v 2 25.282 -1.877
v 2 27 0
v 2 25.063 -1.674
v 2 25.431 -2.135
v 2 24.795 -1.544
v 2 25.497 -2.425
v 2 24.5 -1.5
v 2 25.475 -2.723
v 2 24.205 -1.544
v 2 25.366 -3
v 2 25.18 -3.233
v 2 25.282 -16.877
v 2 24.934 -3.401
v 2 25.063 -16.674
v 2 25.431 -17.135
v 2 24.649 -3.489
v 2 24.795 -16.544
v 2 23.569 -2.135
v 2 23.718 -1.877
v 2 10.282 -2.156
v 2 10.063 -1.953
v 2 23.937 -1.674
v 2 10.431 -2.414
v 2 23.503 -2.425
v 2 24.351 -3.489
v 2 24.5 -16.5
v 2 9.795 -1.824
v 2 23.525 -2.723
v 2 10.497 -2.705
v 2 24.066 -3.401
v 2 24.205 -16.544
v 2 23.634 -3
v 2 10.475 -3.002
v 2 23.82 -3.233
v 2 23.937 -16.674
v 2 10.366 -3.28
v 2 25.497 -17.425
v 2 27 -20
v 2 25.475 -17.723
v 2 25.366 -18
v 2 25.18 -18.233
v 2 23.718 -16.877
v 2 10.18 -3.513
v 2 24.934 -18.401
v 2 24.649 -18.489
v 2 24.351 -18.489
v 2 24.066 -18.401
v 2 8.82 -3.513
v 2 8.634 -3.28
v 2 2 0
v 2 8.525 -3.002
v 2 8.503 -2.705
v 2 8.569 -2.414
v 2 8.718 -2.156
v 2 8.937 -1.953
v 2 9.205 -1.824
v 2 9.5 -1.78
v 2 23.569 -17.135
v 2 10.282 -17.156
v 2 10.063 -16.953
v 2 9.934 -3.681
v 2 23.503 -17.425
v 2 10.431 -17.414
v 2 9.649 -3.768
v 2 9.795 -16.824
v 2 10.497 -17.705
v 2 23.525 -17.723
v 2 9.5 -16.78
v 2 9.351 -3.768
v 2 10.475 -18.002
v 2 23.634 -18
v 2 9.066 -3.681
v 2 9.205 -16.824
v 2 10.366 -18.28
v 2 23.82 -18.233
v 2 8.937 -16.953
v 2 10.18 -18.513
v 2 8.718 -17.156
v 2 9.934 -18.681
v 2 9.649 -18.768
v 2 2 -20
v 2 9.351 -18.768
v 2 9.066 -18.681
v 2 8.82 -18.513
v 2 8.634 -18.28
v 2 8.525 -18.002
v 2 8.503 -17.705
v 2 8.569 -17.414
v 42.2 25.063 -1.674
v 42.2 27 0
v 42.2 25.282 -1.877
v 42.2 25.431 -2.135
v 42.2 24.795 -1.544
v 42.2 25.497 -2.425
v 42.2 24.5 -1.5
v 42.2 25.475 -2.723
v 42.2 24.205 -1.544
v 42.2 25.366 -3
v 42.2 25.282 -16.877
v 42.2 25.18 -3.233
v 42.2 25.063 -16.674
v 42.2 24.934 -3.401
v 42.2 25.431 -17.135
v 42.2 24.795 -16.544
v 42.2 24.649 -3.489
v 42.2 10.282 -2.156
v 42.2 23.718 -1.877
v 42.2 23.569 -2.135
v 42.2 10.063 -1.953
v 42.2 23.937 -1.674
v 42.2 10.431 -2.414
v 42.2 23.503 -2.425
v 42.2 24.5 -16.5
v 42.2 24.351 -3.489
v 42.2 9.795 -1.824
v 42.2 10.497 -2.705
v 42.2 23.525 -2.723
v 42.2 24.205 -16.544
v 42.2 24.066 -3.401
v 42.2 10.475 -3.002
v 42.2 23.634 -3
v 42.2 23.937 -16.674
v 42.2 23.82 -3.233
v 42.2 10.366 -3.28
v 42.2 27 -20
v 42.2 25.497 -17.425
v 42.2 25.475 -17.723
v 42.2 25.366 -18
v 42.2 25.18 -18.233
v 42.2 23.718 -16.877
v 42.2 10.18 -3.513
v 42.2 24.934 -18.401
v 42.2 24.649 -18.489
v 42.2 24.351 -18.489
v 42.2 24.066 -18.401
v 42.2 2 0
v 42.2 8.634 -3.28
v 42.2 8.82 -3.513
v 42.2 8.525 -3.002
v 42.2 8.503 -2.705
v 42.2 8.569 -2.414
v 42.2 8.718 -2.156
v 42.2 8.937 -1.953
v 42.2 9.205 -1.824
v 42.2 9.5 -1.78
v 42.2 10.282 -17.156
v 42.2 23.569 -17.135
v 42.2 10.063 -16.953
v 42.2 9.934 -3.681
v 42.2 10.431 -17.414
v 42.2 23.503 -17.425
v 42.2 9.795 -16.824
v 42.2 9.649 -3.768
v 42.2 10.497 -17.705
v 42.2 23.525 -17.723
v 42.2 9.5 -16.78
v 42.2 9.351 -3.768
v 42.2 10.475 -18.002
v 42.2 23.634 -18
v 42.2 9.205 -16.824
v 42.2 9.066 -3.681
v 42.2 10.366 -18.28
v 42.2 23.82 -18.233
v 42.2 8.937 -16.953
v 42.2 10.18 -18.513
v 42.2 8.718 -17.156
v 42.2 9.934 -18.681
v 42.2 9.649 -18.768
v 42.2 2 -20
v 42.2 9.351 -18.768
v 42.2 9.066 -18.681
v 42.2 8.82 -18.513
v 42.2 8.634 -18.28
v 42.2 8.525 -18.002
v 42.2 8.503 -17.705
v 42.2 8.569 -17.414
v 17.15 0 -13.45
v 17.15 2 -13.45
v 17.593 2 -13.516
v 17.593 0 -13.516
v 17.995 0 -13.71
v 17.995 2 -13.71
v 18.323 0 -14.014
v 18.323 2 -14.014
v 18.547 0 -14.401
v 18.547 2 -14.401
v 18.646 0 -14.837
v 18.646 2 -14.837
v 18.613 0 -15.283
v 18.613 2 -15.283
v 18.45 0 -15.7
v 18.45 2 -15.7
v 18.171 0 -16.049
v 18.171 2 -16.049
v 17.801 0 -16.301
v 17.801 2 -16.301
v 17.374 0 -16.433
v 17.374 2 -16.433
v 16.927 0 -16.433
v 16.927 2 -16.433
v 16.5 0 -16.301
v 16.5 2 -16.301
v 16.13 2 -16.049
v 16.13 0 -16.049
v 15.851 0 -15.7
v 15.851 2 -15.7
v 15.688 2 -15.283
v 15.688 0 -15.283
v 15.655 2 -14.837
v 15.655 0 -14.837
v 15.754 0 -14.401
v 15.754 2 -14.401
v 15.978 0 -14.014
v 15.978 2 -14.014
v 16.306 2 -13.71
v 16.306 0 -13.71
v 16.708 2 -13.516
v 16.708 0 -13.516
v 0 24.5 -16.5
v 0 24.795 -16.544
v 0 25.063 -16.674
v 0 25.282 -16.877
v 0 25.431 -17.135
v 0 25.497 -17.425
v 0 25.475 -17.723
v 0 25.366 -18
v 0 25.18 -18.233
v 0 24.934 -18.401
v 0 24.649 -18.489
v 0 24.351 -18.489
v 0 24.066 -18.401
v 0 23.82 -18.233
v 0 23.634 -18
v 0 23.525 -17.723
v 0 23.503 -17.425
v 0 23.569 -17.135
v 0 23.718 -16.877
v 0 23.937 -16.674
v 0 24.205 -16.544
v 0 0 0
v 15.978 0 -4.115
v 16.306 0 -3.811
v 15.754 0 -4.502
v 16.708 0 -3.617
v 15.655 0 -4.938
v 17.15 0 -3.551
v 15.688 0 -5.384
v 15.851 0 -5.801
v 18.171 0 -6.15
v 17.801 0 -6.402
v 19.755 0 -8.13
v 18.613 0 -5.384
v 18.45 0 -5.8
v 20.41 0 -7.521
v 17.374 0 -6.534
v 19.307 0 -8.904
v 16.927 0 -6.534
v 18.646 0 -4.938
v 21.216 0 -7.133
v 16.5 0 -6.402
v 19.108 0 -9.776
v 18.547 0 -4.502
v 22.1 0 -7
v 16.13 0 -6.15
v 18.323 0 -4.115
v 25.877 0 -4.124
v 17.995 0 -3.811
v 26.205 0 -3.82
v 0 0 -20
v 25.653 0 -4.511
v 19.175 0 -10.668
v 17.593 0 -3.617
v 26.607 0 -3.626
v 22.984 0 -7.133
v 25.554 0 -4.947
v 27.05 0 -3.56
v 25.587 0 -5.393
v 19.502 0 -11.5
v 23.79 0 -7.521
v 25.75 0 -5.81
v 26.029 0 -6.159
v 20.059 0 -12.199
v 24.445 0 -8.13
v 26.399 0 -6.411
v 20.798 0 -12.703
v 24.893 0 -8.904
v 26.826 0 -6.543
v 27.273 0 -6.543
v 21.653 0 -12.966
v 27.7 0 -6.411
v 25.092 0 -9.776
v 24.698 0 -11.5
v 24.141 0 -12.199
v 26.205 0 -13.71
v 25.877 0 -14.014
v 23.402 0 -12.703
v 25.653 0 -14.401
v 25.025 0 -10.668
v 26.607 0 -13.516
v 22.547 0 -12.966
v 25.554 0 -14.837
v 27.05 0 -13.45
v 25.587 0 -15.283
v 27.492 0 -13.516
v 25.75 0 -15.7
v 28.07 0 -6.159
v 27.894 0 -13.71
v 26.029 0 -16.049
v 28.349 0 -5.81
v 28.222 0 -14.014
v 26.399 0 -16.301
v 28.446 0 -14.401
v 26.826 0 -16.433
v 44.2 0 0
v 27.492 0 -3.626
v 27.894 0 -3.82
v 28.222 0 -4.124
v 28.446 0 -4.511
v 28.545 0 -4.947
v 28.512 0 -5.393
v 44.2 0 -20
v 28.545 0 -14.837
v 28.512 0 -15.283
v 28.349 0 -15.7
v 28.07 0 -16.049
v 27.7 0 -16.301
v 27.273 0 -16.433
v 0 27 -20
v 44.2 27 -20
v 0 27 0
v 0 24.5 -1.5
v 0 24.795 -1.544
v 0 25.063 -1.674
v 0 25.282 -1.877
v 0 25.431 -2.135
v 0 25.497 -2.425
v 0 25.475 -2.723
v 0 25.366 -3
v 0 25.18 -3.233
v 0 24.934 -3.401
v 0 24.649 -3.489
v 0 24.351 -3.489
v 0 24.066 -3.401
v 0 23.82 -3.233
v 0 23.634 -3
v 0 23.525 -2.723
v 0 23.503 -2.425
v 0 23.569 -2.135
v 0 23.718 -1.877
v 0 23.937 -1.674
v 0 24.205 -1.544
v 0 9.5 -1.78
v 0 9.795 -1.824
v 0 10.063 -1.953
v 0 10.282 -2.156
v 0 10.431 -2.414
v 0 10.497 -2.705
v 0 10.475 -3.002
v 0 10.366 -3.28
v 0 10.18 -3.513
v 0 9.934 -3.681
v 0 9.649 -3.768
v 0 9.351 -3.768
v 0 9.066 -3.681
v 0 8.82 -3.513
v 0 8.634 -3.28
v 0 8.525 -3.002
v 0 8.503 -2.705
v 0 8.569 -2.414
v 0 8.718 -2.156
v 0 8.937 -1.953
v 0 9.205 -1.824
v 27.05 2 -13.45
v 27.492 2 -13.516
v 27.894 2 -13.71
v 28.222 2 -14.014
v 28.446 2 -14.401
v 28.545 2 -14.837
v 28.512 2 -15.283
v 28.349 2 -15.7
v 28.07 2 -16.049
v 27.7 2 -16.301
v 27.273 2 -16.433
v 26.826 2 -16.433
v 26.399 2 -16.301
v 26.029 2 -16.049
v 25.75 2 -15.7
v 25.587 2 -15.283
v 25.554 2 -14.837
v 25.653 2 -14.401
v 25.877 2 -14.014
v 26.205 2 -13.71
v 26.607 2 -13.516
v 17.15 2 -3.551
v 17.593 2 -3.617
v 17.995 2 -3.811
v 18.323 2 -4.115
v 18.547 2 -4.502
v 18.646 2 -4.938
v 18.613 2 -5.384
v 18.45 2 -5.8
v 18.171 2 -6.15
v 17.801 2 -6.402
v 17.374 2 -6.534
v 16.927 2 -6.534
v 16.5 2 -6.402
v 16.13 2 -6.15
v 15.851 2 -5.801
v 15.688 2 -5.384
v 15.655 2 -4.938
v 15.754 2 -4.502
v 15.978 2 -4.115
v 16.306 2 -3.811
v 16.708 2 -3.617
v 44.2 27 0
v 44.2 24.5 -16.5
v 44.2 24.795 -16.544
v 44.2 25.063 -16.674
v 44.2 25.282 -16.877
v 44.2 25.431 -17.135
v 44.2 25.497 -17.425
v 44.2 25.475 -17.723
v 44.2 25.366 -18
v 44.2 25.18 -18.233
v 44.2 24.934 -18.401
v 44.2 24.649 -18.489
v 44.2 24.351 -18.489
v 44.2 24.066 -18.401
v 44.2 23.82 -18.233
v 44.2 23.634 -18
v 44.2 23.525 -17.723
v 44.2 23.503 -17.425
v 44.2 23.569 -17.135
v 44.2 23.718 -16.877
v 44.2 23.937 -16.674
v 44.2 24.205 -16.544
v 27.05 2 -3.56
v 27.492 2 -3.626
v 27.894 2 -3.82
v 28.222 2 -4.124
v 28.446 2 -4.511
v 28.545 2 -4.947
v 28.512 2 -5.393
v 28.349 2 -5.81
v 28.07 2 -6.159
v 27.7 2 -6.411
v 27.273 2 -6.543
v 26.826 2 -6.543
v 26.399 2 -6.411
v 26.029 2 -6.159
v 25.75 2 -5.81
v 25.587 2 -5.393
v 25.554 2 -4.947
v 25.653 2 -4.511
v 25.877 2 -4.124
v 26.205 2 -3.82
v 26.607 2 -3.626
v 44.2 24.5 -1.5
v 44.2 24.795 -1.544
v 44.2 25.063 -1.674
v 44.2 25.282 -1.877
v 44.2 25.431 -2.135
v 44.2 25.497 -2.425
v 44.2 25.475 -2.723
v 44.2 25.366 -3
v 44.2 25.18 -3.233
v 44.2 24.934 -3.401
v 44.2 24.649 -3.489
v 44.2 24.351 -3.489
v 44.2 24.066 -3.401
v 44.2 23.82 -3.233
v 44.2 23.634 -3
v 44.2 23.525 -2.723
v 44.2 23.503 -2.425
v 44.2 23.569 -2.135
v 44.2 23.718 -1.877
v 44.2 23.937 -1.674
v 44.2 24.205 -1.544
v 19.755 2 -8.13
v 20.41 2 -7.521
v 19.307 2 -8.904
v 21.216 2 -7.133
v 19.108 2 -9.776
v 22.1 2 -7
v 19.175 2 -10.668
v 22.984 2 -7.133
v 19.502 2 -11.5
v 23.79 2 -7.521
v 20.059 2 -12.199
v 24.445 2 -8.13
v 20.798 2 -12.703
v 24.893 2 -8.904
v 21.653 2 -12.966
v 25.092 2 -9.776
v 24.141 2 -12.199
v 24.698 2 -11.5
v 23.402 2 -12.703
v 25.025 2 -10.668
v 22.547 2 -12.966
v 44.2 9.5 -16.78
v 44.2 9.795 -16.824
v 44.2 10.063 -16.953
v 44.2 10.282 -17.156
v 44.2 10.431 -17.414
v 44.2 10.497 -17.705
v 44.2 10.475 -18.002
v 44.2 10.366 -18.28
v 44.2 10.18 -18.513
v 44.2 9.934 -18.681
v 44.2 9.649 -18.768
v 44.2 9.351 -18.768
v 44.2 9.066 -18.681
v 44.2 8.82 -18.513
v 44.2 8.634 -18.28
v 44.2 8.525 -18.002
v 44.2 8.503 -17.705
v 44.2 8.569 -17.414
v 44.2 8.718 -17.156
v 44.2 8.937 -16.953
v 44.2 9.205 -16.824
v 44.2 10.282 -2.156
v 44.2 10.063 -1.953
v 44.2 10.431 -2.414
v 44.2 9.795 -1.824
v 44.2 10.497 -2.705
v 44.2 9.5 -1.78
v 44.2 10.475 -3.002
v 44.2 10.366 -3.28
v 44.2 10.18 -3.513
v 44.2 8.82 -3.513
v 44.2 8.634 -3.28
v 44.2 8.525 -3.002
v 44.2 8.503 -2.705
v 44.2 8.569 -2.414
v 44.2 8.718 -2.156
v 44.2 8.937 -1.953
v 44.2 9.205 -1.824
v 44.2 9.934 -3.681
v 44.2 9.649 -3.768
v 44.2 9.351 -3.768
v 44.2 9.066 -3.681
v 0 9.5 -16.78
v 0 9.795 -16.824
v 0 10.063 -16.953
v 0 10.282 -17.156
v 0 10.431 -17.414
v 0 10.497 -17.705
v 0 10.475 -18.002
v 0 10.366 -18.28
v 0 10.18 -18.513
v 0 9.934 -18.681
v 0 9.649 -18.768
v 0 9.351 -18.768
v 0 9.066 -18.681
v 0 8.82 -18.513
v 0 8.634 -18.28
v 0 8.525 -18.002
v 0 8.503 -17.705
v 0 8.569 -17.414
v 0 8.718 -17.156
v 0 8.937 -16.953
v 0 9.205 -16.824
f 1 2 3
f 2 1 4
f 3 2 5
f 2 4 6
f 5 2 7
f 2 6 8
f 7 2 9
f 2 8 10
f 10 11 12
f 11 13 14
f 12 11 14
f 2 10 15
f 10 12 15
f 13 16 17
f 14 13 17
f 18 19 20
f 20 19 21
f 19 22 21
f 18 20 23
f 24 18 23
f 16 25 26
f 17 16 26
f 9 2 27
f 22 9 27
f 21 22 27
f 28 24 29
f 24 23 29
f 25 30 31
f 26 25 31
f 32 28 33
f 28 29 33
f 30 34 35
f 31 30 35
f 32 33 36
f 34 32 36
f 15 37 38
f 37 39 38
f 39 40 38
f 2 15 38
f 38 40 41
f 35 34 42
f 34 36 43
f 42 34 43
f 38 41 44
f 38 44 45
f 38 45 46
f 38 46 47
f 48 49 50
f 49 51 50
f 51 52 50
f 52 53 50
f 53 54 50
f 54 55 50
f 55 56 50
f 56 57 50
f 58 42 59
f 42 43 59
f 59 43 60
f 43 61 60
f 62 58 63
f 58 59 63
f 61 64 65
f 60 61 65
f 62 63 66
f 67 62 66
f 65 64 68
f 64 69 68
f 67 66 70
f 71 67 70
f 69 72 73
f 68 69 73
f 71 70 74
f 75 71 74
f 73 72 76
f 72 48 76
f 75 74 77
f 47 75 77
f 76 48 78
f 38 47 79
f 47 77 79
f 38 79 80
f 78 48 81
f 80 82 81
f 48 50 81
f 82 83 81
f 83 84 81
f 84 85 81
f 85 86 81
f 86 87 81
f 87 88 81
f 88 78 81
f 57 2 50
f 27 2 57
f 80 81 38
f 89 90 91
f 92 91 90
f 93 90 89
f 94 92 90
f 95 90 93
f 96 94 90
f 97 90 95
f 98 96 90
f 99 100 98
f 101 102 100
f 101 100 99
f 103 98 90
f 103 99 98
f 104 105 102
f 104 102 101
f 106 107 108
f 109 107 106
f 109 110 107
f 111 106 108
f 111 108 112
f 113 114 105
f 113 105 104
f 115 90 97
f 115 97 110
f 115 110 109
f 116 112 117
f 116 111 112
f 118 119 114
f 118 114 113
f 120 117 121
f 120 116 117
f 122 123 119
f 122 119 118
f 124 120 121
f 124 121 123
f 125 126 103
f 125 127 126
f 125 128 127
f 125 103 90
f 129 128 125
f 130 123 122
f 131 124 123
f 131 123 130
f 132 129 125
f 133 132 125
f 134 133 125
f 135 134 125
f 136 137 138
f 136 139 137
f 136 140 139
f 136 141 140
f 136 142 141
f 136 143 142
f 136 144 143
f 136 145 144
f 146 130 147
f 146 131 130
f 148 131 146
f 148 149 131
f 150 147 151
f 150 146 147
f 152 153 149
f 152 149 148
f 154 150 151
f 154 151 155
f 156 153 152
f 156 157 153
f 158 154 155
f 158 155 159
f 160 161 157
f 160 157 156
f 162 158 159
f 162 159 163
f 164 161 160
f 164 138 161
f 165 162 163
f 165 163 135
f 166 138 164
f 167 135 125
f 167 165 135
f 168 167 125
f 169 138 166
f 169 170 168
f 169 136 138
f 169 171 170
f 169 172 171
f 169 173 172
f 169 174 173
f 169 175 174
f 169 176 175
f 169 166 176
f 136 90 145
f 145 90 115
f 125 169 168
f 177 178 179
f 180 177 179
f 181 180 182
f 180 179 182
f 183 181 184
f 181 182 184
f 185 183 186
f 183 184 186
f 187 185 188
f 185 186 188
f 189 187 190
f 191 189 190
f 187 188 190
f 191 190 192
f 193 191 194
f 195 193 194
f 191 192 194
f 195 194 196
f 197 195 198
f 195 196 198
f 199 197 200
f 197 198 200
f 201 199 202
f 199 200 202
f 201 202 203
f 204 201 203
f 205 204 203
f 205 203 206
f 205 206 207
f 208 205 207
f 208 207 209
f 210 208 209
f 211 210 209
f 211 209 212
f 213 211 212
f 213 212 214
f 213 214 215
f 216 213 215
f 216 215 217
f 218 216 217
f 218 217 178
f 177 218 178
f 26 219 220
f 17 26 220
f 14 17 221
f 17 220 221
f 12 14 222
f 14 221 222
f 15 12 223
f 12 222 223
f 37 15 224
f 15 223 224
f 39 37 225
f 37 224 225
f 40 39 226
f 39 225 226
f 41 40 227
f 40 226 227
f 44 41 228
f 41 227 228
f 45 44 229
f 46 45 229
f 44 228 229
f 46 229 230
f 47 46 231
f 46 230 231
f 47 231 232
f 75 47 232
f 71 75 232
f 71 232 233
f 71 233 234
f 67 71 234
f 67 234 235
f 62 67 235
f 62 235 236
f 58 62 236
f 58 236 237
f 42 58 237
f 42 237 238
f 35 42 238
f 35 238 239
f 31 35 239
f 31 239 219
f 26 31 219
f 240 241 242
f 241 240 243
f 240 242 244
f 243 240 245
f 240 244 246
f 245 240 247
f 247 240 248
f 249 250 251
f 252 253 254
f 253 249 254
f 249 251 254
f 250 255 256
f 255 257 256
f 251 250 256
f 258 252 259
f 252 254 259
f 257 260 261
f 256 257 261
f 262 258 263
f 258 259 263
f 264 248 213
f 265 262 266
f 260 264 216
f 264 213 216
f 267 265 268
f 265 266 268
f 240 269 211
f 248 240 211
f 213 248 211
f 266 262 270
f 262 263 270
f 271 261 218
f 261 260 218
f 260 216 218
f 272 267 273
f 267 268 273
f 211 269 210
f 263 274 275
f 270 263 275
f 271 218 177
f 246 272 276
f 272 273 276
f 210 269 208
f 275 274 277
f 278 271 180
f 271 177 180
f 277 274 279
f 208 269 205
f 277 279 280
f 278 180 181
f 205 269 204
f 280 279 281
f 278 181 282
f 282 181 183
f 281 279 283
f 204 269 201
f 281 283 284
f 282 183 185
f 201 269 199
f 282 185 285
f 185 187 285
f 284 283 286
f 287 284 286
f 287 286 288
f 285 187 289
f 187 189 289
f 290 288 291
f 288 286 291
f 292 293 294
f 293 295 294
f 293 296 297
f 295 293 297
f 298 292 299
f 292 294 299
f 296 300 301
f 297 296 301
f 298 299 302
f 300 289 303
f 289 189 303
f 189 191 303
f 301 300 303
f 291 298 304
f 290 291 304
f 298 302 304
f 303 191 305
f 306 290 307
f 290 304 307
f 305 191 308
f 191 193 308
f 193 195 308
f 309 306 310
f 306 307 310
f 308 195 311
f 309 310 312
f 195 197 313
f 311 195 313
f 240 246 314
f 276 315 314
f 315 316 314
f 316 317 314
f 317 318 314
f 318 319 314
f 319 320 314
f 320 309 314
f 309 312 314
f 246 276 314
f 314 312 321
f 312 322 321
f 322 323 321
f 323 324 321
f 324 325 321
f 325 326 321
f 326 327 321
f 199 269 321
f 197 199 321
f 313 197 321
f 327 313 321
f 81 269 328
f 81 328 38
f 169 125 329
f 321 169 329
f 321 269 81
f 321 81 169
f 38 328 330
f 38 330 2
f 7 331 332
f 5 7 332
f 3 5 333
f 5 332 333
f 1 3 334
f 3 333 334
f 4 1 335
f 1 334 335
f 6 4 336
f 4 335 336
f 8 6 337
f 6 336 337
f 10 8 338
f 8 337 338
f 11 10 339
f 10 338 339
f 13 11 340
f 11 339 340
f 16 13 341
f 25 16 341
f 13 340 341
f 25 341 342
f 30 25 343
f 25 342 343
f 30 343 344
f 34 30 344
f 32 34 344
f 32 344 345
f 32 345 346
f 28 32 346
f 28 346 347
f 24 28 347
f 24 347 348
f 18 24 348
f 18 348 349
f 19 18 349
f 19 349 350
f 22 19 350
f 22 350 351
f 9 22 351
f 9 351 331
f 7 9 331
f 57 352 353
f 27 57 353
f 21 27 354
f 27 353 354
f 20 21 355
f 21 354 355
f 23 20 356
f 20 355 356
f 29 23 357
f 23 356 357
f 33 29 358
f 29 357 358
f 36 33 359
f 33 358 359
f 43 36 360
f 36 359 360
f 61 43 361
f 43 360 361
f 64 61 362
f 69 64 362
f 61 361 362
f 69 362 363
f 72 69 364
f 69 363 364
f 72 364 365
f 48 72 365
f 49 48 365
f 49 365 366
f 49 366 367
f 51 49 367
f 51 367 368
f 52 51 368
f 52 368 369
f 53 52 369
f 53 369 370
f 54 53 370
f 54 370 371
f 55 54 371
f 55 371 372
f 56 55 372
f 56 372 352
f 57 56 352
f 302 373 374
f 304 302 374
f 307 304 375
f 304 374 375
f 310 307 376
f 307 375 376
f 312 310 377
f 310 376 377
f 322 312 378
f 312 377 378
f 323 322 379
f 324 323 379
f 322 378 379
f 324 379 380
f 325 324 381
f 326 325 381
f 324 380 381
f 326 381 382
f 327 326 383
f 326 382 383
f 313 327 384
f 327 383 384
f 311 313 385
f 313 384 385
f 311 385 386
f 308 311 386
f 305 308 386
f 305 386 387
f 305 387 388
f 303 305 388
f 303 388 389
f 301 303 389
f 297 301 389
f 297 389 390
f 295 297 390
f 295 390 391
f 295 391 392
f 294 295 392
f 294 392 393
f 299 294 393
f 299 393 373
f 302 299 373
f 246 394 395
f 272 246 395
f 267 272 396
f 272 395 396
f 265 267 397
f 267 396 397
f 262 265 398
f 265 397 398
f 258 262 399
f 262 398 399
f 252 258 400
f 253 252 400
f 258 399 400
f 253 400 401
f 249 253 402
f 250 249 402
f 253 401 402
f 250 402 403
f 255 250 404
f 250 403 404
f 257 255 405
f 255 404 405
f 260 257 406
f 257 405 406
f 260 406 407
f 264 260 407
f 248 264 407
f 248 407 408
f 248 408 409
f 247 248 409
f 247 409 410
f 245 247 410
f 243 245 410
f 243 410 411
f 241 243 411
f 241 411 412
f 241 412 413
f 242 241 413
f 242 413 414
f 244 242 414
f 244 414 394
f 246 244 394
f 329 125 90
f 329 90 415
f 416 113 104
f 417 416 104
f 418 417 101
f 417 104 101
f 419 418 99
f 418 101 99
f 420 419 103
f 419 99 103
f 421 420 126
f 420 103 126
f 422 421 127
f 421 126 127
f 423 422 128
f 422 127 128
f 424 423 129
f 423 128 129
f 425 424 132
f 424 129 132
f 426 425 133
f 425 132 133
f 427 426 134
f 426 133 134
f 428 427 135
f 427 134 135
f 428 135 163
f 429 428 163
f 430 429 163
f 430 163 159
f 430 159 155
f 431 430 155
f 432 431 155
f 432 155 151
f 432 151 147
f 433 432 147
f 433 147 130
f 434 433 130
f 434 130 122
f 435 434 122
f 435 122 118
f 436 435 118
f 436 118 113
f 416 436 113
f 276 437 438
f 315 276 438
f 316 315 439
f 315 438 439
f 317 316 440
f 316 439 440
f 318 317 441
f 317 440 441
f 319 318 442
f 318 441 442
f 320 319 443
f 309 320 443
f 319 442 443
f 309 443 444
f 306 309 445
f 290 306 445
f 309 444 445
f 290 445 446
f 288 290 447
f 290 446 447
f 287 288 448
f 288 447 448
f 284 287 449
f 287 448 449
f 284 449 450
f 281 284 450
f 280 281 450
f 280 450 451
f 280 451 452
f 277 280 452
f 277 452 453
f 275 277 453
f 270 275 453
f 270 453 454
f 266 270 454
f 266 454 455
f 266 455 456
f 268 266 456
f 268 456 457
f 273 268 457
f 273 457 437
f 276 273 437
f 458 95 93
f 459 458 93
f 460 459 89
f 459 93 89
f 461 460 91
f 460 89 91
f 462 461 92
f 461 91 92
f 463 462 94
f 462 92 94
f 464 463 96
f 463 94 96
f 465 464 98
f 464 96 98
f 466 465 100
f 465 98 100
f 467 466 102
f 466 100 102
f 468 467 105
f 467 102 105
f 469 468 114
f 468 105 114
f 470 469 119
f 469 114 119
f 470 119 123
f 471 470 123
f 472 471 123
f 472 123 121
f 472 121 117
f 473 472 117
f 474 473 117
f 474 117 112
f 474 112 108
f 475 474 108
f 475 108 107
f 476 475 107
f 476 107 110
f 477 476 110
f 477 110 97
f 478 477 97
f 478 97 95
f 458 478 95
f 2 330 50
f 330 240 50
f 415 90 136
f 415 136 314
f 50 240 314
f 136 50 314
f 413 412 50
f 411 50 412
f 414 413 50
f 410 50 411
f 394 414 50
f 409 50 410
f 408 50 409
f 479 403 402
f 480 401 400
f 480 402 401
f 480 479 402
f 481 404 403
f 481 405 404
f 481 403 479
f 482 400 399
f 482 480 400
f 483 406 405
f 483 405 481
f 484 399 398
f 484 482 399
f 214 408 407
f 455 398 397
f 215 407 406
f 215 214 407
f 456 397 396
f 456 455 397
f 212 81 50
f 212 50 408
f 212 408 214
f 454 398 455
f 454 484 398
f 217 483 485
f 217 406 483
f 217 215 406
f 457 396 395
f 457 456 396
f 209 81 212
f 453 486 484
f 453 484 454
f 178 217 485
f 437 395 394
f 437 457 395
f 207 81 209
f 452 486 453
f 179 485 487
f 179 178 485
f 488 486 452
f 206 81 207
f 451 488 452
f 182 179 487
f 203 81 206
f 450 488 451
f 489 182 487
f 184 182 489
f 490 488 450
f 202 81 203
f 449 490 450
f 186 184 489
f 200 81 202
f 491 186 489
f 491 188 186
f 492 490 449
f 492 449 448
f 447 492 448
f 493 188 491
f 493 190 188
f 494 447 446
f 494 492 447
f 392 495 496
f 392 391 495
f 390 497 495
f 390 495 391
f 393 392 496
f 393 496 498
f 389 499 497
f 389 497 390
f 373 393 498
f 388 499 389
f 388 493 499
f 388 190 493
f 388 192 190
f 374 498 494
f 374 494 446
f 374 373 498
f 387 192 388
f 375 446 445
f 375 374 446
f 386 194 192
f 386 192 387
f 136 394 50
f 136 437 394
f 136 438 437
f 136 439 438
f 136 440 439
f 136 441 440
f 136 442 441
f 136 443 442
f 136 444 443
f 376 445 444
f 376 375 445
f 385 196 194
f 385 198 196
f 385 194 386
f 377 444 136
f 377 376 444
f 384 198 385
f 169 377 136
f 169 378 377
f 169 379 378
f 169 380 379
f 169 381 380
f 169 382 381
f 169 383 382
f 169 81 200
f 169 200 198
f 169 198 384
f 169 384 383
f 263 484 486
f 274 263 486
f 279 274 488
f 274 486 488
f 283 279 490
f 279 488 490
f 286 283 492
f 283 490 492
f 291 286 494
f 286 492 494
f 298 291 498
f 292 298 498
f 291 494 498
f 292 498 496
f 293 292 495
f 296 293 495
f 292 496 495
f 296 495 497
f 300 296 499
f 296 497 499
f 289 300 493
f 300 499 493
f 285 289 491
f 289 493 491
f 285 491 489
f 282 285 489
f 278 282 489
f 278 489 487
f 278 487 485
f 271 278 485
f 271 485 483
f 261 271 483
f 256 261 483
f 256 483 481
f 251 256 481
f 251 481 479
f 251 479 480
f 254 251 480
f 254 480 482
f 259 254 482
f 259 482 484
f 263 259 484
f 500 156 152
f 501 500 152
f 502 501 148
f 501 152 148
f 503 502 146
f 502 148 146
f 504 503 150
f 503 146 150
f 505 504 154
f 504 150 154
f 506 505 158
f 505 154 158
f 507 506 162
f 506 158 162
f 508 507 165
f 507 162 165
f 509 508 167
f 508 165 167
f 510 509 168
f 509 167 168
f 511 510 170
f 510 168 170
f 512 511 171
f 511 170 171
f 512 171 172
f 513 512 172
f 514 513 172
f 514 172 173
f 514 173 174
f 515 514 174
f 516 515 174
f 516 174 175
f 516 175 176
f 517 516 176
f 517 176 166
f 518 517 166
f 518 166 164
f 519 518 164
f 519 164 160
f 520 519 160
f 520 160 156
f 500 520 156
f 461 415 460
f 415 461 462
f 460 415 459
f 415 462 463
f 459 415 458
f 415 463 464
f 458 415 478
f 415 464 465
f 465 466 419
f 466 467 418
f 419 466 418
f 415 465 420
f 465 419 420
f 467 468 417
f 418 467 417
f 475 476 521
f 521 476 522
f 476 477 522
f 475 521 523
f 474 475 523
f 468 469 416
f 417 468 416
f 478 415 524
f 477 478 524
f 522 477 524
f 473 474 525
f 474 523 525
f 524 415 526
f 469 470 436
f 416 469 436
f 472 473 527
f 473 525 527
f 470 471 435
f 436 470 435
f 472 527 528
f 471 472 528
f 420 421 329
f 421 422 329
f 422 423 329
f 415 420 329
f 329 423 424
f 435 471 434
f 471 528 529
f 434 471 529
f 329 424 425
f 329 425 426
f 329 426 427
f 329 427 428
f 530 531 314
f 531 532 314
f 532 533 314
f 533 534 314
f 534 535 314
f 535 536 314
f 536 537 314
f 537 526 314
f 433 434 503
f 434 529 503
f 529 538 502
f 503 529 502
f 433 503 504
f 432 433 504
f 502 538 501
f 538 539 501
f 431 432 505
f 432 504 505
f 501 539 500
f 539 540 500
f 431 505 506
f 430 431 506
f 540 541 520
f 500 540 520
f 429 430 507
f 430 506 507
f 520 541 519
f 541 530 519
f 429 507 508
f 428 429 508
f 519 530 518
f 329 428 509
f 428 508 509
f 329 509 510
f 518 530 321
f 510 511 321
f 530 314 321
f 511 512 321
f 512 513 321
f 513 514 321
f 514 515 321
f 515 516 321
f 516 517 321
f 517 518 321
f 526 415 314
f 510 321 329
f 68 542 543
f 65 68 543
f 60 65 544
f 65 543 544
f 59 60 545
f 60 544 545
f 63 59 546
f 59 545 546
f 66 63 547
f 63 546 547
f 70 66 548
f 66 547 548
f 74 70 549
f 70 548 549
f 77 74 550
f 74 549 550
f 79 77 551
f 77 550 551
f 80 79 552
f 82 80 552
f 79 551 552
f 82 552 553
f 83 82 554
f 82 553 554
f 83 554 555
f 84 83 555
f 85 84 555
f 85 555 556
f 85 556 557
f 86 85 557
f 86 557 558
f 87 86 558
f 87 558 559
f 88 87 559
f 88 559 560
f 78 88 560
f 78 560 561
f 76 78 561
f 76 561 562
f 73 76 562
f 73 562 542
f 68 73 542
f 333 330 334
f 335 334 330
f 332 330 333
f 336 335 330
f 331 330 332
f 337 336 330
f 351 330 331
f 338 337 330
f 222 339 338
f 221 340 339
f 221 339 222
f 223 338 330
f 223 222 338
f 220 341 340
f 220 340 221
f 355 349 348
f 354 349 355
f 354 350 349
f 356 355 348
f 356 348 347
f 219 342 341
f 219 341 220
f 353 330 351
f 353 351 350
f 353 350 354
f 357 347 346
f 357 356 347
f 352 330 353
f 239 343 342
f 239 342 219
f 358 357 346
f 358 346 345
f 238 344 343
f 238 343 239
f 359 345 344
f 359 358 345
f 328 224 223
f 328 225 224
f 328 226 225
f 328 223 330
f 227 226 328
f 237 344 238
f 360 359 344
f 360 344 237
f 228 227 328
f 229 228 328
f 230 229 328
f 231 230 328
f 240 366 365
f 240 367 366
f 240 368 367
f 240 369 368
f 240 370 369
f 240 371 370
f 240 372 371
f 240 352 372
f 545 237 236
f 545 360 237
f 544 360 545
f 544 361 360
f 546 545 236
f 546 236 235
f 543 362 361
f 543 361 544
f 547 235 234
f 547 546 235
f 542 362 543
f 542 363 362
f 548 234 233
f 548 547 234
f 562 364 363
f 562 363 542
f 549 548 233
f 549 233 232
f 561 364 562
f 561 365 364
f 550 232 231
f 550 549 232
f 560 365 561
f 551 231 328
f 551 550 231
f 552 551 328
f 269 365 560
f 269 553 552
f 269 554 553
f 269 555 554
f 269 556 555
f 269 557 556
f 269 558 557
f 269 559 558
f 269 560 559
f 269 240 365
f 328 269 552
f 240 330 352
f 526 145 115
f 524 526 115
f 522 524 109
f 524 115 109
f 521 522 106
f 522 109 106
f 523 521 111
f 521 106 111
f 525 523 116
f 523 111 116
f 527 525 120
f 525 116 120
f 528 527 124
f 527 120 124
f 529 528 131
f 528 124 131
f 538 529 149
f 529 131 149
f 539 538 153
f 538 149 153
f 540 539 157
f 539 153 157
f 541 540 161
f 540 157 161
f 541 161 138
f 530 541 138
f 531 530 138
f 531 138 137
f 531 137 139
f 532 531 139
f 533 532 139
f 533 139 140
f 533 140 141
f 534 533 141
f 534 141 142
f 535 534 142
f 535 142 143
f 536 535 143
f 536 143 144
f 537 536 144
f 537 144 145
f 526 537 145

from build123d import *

# Parameters (mm, degrees)
SKETCH1_W           = 44.2
SKETCH1_H           = 20
BOSS_EXTRUDE1_DEPTH = 2
SKETCH2_W           = 2
SKETCH2_H           = 20
BOSS_EXTRUDE2_DEPTH = 25
SKETCH3_R           = 3
SKETCH3_R_2         = 1.5
CUT_EXTRUDE1_DEPTH  = 25
SKETCH5_R           = 1
CUT_EXTRUDE2_DEPTH  = 56.521527357


with BuildPart() as part:
    # Sketch1 → Boss-Extrude1 (new body)
    with BuildSketch(Plane(origin=(0, 0, 0), x_dir=(1, 0, 0), z_dir=(0, 1, 0))):
        with Locations((22.1, 10)):
            Rectangle(SKETCH1_W, SKETCH1_H)
    extrude(amount=BOSS_EXTRUDE1_DEPTH)

    # Sketch2 → Boss-Extrude2 (add)
    with BuildSketch(Plane(origin=(0, 2, 0), x_dir=(1, 0, 0), z_dir=(0, 1, 0))):
        with Locations((1, 10)):
            Rectangle(SKETCH2_W, SKETCH2_H)
        with Locations((43.2, 10)):
            Rectangle(SKETCH2_W, SKETCH2_H)
    extrude(amount=BOSS_EXTRUDE2_DEPTH)

    # Sketch3 → Cut-Extrude1 (cut)
    with BuildSketch(Plane(origin=(0, 2, 0), x_dir=(1, 0, 0), z_dir=(0, 1, 0))):
        with Locations(Location((22.1, 10, 0), (0, 0, 270))):
            Circle(SKETCH3_R)
        with Locations(Location((17.1505, 14.9495, 0), (0, 0, 270))):
            Circle(SKETCH3_R_2)
        with Locations(Location((17.1505, 5.0505, 0), (0, 0, 270))):
            Circle(SKETCH3_R_2)
        with Locations(Location((27.0495, 5.0595, 0), (0, 0, 270))):
            Circle(SKETCH3_R_2)
        with Locations(Location((27.0495, 14.9495, 0), (0, 0, 270))):
            Circle(SKETCH3_R_2)
    extrude(amount=-CUT_EXTRUDE1_DEPTH, mode=Mode.SUBTRACT)

    # Sketch5 → Cut-Extrude2 (cut, through all)
    with BuildSketch(Plane.ZY):
        with Locations((-2.5, 24.5)):
            Circle(SKETCH5_R)
        with Locations((-2.779646808, 9.5)):
            Circle(SKETCH5_R)
        with Locations((-17.5, 24.5)):
            Circle(SKETCH5_R)
        with Locations((-17.779646808, 9.5)):
            Circle(SKETCH5_R)
    extrude(amount=-CUT_EXTRUDE2_DEPTH, mode=Mode.SUBTRACT)


solid = part.part
